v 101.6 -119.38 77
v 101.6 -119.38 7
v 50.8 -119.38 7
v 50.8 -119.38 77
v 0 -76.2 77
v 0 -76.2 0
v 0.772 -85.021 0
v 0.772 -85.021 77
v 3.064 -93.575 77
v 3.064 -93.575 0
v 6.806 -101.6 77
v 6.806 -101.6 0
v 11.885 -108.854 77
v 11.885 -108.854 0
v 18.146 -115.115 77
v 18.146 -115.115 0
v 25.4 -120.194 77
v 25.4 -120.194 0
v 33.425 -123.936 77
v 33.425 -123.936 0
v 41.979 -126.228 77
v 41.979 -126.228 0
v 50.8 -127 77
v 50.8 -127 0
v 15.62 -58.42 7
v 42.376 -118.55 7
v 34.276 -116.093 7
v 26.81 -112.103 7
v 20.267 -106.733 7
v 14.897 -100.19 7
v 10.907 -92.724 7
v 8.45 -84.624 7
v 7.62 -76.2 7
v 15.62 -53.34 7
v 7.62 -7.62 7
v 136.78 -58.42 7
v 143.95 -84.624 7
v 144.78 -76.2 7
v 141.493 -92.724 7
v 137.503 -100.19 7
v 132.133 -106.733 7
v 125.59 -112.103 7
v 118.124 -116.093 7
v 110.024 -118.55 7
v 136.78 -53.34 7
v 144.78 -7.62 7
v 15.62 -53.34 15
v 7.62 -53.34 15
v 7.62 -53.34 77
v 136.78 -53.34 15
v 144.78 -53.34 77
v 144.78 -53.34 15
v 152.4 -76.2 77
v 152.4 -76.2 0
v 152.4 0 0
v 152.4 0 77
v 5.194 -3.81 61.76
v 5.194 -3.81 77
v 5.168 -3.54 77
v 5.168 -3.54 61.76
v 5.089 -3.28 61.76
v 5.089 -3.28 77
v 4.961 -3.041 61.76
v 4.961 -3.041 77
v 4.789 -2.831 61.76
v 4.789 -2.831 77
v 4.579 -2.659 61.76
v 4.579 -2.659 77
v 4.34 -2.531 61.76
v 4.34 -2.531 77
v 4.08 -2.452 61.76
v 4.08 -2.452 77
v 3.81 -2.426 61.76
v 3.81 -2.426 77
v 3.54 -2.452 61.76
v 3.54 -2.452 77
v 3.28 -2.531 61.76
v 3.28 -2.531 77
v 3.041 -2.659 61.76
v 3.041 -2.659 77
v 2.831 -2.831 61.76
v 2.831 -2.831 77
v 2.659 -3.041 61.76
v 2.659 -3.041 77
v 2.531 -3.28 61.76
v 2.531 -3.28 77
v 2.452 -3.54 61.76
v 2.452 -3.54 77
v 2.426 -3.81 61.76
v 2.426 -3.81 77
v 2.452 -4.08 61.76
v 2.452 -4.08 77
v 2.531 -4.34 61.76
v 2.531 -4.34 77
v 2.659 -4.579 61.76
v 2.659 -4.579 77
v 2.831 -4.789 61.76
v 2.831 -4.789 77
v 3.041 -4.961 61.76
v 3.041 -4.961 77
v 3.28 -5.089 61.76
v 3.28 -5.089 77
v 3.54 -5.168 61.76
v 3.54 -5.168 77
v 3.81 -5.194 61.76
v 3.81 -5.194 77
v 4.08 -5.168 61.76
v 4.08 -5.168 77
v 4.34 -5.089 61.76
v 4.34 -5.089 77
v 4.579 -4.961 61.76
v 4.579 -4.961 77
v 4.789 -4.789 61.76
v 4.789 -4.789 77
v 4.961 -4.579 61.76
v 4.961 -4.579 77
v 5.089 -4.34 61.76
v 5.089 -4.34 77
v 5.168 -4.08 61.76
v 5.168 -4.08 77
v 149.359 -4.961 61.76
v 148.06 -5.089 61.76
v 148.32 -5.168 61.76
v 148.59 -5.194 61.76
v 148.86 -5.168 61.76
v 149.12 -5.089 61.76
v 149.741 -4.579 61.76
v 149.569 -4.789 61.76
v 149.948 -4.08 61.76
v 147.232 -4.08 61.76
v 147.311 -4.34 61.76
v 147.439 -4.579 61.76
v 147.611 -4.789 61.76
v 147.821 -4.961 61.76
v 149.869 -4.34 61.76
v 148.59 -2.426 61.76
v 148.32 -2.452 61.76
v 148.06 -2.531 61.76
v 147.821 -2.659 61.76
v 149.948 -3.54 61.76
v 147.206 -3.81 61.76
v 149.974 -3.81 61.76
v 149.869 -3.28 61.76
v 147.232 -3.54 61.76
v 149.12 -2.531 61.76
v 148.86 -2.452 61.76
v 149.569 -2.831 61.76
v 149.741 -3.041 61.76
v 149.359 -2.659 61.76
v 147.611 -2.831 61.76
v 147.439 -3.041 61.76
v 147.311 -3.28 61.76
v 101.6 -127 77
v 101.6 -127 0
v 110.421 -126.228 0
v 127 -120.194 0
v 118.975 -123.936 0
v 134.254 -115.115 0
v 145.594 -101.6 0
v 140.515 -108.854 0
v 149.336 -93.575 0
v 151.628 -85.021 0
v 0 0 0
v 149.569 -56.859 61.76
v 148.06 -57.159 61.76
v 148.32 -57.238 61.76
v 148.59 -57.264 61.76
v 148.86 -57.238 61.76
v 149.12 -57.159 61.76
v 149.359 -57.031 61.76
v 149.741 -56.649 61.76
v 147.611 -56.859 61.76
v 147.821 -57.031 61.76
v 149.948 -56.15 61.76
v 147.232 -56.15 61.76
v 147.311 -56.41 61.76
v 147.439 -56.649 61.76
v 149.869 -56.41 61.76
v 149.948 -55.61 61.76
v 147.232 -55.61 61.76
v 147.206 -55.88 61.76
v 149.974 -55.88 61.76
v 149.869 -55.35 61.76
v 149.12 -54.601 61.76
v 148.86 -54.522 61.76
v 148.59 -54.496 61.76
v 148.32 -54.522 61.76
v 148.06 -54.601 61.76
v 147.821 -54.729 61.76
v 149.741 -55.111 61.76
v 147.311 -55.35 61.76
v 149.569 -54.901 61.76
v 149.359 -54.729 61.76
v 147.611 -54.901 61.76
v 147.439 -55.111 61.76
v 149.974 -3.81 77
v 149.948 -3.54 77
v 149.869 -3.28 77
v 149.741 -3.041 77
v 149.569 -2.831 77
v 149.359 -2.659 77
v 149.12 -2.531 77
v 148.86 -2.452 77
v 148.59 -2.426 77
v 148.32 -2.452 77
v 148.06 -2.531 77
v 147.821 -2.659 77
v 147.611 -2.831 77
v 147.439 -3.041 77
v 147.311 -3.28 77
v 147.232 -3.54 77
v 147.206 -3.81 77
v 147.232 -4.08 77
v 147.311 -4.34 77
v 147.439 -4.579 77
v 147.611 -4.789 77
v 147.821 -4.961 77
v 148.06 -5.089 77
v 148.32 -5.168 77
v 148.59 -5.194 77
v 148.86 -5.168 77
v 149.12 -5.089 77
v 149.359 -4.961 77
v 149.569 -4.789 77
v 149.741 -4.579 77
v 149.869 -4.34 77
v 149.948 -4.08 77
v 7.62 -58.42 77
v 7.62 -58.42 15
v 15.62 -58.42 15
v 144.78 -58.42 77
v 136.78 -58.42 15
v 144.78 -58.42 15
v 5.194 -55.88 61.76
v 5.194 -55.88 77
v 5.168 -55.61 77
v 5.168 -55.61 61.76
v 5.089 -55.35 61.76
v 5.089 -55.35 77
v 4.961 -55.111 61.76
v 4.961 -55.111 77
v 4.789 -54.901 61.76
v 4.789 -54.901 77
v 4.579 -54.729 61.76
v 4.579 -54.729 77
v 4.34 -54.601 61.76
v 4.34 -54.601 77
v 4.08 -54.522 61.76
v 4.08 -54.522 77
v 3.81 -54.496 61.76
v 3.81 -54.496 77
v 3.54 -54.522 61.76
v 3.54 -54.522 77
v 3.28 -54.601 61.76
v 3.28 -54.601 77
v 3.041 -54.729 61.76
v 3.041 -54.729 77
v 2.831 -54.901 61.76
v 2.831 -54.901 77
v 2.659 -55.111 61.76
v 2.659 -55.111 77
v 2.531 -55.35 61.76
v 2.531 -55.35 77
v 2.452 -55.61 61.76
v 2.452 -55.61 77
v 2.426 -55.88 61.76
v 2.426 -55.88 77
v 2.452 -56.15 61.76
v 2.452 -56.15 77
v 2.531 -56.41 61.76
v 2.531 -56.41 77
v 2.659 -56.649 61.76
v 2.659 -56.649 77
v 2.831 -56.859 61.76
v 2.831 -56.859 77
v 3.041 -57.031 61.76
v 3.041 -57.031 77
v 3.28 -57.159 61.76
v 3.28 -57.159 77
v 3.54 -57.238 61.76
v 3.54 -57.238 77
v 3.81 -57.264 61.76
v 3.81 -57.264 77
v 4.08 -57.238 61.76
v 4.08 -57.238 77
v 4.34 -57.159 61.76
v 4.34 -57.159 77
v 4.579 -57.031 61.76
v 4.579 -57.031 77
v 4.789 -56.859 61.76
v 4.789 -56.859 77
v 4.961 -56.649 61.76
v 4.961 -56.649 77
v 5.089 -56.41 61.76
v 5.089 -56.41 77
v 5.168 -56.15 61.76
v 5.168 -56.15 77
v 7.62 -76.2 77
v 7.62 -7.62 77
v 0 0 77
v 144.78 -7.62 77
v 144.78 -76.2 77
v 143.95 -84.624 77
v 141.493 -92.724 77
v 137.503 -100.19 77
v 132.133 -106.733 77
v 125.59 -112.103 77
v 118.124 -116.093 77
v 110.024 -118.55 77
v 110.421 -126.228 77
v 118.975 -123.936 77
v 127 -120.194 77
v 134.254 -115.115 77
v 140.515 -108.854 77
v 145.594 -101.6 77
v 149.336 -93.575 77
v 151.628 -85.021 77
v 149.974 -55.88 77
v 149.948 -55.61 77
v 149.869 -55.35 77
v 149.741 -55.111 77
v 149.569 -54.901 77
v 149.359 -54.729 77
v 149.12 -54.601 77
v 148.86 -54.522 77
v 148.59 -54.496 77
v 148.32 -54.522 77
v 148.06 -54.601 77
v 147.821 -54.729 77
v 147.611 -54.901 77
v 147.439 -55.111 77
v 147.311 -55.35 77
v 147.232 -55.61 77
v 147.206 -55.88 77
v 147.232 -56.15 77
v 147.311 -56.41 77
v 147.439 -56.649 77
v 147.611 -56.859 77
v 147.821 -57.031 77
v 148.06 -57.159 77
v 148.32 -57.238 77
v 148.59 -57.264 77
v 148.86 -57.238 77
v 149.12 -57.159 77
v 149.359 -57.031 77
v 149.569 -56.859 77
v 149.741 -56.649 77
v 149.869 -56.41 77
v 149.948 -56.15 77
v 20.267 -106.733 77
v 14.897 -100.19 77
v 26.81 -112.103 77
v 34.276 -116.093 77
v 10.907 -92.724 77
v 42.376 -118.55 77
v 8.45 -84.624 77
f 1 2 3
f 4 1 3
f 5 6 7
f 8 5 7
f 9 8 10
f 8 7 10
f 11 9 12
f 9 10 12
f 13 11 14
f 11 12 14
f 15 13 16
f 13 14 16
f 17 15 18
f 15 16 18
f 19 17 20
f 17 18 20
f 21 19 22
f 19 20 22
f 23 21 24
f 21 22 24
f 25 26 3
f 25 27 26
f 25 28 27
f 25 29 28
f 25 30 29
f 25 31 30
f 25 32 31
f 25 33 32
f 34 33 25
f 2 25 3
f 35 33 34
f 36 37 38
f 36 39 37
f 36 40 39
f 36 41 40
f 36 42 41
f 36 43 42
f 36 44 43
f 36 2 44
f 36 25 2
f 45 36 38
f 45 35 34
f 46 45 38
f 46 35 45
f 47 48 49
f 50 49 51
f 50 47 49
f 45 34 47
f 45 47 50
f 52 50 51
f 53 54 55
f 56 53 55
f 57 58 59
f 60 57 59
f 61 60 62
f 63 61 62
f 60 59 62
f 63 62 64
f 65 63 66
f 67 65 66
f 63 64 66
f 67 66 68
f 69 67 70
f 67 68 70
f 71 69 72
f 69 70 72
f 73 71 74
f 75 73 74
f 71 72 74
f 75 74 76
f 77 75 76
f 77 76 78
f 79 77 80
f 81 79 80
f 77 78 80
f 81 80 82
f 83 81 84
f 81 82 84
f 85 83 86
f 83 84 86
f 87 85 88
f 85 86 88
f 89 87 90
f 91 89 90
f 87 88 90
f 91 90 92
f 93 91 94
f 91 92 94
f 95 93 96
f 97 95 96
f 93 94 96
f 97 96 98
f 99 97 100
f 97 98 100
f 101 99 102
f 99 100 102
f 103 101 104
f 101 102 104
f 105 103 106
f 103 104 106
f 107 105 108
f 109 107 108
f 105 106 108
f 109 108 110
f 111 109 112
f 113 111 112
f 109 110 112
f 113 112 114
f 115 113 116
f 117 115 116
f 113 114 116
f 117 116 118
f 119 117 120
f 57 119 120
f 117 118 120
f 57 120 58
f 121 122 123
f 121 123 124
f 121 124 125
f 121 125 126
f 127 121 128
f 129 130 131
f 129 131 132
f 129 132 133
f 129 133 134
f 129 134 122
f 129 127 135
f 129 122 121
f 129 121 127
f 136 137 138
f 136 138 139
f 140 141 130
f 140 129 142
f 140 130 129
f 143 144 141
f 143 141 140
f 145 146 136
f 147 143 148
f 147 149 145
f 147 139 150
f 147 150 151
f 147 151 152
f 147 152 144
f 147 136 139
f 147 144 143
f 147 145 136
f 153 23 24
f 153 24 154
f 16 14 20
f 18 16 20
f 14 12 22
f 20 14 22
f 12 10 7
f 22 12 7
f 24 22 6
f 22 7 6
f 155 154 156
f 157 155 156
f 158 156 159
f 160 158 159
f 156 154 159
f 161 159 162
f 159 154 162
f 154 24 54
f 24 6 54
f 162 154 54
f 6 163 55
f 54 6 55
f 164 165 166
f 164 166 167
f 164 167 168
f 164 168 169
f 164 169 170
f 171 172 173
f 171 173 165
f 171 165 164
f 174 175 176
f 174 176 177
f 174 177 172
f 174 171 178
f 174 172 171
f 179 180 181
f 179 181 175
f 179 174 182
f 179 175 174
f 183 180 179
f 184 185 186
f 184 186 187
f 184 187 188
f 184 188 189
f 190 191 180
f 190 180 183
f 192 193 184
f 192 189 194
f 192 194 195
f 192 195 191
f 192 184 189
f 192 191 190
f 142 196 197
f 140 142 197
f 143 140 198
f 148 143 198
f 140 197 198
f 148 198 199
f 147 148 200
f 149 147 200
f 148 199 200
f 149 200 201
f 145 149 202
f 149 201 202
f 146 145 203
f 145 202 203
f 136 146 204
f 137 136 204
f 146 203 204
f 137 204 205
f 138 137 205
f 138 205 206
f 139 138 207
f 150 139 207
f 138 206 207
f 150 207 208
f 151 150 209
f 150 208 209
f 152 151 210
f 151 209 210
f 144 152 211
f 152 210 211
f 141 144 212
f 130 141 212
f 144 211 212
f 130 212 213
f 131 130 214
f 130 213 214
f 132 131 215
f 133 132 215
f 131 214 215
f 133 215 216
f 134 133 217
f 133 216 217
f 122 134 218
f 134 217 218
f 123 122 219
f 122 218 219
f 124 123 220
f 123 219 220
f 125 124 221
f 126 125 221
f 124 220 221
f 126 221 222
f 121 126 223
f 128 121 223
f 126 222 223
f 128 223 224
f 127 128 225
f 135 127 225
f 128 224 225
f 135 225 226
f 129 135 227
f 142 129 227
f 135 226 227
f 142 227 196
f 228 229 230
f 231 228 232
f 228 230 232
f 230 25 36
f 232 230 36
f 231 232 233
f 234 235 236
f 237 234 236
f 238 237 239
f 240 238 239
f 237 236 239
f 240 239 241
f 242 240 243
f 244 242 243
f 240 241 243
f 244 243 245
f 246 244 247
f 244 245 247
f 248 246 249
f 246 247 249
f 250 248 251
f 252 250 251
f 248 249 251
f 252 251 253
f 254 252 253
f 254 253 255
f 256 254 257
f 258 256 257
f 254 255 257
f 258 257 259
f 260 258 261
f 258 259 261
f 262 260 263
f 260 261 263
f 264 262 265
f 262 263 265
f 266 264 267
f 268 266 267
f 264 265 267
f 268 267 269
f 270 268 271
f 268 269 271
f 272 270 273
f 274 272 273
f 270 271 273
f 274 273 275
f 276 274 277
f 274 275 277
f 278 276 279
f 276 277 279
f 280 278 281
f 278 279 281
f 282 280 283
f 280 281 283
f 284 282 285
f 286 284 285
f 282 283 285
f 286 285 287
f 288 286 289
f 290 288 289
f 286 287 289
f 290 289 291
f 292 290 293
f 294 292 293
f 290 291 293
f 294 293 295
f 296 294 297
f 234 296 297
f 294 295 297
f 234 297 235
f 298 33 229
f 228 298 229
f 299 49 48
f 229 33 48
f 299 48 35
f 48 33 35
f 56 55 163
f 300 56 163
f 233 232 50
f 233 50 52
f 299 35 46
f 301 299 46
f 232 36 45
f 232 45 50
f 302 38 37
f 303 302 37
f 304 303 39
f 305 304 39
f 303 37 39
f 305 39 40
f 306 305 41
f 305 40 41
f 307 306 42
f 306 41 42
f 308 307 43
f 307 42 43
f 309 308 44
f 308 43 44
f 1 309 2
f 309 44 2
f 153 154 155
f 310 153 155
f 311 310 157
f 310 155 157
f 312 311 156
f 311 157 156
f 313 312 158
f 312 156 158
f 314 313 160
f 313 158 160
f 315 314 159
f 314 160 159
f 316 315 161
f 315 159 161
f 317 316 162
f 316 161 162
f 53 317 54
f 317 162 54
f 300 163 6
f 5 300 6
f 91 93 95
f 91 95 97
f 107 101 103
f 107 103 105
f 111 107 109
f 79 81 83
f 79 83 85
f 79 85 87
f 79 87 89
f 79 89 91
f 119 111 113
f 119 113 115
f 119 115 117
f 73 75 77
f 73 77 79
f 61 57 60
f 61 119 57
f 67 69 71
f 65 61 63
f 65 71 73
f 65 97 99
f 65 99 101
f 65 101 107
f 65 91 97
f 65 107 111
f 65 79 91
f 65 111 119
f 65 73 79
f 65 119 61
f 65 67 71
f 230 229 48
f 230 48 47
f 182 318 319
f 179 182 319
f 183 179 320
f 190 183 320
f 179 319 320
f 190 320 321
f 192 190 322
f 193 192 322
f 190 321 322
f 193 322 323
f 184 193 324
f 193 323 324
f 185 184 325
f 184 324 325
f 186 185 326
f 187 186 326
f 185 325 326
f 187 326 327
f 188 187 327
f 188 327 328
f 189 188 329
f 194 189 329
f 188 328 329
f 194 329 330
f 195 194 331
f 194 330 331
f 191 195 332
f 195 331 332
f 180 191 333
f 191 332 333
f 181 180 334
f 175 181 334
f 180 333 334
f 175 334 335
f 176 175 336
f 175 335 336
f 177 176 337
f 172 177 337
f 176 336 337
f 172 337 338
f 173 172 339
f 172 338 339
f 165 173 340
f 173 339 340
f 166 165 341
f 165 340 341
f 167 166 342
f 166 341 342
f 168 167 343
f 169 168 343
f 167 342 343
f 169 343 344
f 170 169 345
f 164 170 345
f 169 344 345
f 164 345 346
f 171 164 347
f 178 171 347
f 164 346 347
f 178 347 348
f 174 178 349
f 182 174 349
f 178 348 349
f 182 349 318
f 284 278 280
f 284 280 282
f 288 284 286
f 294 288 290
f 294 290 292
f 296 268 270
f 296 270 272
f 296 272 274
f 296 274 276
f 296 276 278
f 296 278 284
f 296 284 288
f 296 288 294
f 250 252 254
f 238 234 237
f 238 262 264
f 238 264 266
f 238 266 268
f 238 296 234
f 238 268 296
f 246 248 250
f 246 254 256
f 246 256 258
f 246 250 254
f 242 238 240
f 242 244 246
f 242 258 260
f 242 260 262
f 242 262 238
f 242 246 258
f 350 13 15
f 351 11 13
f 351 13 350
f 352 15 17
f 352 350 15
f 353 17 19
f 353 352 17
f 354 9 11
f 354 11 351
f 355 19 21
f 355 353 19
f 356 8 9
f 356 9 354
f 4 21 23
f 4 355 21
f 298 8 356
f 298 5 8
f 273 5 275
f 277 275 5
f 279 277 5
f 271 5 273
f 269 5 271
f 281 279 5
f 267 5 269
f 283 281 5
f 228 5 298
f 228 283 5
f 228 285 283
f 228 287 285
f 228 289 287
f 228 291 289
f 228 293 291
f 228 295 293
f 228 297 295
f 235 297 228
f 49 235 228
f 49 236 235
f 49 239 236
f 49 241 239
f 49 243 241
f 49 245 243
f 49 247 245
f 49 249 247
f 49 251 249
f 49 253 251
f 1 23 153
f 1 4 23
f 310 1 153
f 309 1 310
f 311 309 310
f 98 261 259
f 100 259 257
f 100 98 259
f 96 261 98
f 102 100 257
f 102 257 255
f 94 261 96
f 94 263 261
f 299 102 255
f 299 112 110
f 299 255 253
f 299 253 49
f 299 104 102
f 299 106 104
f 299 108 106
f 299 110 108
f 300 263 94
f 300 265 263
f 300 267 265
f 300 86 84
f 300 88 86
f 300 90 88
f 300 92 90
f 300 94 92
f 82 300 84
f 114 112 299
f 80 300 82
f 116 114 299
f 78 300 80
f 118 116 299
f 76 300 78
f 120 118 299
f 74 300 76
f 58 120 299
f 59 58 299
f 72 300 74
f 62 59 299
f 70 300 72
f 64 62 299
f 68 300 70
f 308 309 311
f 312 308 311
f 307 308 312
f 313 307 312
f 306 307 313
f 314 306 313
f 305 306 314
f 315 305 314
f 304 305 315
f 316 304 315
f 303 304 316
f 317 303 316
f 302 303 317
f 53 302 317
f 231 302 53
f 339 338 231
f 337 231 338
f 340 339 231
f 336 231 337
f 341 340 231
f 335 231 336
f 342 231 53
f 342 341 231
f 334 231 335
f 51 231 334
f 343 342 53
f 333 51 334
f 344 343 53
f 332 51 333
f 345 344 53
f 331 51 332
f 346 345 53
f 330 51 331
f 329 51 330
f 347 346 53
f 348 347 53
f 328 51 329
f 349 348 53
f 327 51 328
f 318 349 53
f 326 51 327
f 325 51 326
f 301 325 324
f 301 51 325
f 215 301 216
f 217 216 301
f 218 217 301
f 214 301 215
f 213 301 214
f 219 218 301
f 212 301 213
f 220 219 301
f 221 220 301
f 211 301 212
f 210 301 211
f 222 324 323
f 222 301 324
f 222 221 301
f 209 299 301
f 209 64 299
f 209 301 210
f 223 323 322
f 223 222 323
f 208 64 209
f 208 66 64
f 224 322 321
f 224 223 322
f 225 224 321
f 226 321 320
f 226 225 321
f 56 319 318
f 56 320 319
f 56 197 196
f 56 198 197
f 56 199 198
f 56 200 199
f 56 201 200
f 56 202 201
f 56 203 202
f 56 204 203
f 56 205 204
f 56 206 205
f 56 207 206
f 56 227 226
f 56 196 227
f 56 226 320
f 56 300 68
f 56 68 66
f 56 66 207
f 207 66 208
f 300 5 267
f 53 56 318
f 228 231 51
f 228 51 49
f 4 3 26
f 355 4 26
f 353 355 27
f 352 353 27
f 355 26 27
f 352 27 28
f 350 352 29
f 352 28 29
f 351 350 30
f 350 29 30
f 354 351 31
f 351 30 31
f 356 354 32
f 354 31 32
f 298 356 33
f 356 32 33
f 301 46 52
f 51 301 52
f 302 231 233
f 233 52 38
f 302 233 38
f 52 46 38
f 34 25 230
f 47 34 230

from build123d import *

# Parameters (mm, degrees)
F1_DEPTH = 7
F2_W     = 137.16
F2_H     = 5.08
F3_DEPTH = 100
F5_DEPTH = 30
F6_W     = 8
F6_H     = 8
F7_DEPTH = 25.4
F8_R     = 1.3843
F9_DEPTH = 15.24


with BuildPart() as f1:
    # F0 (on Top) → F1 (new body)
    with BuildSketch(Plane.XY):
        with BuildLine():
            Line((152.4, 0), (0, 0))
            Line((0, 0), (0, -76.2))
            ThreePointArc((0, -76.2), (14.878976, -112.121024), (50.8, -127))
            Line((50.8, -127), (101.6, -127))
            ThreePointArc((101.6, -127), (137.521024, -112.121024), (152.4, -76.2))
            Line((152.4, -76.2), (152.4, 0))
        make_face()
    extrude(amount=F1_DEPTH)

    # F2 (on face) → F3 (join)
    with BuildSketch(Plane.XY.offset(7)):
        with BuildLine():
            Line((152.4, 0), (0, 0))
            Line((0, 0), (0, -76.2))
            ThreePointArc((0, -76.2), (14.878976, -112.121024), (50.8, -127))
            Line((50.8, -127), (101.6, -127))
            ThreePointArc((101.6, -127), (137.521024, -112.121024), (152.4, -76.2))
            Line((152.4, -76.2), (152.4, 0))
        make_face()
        with BuildLine():
            Line((7.62, -53.34), (7.62, -7.62))
            Line((7.62, -7.62), (144.78, -7.62))
            Line((144.78, -7.62), (144.78, -53.34))
            Line((144.78, -53.34), (144.78, -58.42))
            Line((144.78, -58.42), (144.78, -76.2))
            ThreePointArc((144.78, -76.2), (132.132871, -106.732871), (101.6, -119.38))
            Line((101.6, -119.38), (50.8, -119.38))
            ThreePointArc((50.8, -119.38), (20.267129, -106.732871), (7.62, -76.2))
            Line((7.62, -76.2), (7.62, -58.42))
            Line((7.62, -58.42), (7.62, -53.34))
        make_face(mode=Mode.SUBTRACT)
        with Locations((76.2, -55.88)):
            Rectangle(F2_W, F2_H)
    extrude(amount=F3_DEPTH)

    # F4 (on face) → F5 (cut)
    with BuildSketch(Plane.XY.offset(107)):
        Polygon((0, 0), (0, -58.42), (0, -127), (152.4, -127), (152.4, -58.42), (152.4, 0), align=None)
    extrude(amount=-F5_DEPTH, mode=Mode.SUBTRACT)

    # F6 (on face) → F7 (cut)
    with BuildSketch(Plane.XZ.offset(58.42)):
        with Locations((11.62, 11)):
            Rectangle(F6_W, F6_H)
        with Locations((140.78, 11)):
            Rectangle(F6_W, F6_H)
    extrude(amount=-F7_DEPTH, mode=Mode.SUBTRACT)

    # F8 (on face) → F9 (cut)
    with BuildSketch(Plane.XY.offset(77)):
        with Locations((3.81, -3.81)):
            Circle(F8_R)
        with Locations((3.81, -55.88)):
            Circle(F8_R)
        with Locations((148.59, -3.81)):
            Circle(F8_R)
        with Locations((148.59, -55.88)):
            Circle(F8_R)
    extrude(amount=-F9_DEPTH, mode=Mode.SUBTRACT)


solid = f1.part
